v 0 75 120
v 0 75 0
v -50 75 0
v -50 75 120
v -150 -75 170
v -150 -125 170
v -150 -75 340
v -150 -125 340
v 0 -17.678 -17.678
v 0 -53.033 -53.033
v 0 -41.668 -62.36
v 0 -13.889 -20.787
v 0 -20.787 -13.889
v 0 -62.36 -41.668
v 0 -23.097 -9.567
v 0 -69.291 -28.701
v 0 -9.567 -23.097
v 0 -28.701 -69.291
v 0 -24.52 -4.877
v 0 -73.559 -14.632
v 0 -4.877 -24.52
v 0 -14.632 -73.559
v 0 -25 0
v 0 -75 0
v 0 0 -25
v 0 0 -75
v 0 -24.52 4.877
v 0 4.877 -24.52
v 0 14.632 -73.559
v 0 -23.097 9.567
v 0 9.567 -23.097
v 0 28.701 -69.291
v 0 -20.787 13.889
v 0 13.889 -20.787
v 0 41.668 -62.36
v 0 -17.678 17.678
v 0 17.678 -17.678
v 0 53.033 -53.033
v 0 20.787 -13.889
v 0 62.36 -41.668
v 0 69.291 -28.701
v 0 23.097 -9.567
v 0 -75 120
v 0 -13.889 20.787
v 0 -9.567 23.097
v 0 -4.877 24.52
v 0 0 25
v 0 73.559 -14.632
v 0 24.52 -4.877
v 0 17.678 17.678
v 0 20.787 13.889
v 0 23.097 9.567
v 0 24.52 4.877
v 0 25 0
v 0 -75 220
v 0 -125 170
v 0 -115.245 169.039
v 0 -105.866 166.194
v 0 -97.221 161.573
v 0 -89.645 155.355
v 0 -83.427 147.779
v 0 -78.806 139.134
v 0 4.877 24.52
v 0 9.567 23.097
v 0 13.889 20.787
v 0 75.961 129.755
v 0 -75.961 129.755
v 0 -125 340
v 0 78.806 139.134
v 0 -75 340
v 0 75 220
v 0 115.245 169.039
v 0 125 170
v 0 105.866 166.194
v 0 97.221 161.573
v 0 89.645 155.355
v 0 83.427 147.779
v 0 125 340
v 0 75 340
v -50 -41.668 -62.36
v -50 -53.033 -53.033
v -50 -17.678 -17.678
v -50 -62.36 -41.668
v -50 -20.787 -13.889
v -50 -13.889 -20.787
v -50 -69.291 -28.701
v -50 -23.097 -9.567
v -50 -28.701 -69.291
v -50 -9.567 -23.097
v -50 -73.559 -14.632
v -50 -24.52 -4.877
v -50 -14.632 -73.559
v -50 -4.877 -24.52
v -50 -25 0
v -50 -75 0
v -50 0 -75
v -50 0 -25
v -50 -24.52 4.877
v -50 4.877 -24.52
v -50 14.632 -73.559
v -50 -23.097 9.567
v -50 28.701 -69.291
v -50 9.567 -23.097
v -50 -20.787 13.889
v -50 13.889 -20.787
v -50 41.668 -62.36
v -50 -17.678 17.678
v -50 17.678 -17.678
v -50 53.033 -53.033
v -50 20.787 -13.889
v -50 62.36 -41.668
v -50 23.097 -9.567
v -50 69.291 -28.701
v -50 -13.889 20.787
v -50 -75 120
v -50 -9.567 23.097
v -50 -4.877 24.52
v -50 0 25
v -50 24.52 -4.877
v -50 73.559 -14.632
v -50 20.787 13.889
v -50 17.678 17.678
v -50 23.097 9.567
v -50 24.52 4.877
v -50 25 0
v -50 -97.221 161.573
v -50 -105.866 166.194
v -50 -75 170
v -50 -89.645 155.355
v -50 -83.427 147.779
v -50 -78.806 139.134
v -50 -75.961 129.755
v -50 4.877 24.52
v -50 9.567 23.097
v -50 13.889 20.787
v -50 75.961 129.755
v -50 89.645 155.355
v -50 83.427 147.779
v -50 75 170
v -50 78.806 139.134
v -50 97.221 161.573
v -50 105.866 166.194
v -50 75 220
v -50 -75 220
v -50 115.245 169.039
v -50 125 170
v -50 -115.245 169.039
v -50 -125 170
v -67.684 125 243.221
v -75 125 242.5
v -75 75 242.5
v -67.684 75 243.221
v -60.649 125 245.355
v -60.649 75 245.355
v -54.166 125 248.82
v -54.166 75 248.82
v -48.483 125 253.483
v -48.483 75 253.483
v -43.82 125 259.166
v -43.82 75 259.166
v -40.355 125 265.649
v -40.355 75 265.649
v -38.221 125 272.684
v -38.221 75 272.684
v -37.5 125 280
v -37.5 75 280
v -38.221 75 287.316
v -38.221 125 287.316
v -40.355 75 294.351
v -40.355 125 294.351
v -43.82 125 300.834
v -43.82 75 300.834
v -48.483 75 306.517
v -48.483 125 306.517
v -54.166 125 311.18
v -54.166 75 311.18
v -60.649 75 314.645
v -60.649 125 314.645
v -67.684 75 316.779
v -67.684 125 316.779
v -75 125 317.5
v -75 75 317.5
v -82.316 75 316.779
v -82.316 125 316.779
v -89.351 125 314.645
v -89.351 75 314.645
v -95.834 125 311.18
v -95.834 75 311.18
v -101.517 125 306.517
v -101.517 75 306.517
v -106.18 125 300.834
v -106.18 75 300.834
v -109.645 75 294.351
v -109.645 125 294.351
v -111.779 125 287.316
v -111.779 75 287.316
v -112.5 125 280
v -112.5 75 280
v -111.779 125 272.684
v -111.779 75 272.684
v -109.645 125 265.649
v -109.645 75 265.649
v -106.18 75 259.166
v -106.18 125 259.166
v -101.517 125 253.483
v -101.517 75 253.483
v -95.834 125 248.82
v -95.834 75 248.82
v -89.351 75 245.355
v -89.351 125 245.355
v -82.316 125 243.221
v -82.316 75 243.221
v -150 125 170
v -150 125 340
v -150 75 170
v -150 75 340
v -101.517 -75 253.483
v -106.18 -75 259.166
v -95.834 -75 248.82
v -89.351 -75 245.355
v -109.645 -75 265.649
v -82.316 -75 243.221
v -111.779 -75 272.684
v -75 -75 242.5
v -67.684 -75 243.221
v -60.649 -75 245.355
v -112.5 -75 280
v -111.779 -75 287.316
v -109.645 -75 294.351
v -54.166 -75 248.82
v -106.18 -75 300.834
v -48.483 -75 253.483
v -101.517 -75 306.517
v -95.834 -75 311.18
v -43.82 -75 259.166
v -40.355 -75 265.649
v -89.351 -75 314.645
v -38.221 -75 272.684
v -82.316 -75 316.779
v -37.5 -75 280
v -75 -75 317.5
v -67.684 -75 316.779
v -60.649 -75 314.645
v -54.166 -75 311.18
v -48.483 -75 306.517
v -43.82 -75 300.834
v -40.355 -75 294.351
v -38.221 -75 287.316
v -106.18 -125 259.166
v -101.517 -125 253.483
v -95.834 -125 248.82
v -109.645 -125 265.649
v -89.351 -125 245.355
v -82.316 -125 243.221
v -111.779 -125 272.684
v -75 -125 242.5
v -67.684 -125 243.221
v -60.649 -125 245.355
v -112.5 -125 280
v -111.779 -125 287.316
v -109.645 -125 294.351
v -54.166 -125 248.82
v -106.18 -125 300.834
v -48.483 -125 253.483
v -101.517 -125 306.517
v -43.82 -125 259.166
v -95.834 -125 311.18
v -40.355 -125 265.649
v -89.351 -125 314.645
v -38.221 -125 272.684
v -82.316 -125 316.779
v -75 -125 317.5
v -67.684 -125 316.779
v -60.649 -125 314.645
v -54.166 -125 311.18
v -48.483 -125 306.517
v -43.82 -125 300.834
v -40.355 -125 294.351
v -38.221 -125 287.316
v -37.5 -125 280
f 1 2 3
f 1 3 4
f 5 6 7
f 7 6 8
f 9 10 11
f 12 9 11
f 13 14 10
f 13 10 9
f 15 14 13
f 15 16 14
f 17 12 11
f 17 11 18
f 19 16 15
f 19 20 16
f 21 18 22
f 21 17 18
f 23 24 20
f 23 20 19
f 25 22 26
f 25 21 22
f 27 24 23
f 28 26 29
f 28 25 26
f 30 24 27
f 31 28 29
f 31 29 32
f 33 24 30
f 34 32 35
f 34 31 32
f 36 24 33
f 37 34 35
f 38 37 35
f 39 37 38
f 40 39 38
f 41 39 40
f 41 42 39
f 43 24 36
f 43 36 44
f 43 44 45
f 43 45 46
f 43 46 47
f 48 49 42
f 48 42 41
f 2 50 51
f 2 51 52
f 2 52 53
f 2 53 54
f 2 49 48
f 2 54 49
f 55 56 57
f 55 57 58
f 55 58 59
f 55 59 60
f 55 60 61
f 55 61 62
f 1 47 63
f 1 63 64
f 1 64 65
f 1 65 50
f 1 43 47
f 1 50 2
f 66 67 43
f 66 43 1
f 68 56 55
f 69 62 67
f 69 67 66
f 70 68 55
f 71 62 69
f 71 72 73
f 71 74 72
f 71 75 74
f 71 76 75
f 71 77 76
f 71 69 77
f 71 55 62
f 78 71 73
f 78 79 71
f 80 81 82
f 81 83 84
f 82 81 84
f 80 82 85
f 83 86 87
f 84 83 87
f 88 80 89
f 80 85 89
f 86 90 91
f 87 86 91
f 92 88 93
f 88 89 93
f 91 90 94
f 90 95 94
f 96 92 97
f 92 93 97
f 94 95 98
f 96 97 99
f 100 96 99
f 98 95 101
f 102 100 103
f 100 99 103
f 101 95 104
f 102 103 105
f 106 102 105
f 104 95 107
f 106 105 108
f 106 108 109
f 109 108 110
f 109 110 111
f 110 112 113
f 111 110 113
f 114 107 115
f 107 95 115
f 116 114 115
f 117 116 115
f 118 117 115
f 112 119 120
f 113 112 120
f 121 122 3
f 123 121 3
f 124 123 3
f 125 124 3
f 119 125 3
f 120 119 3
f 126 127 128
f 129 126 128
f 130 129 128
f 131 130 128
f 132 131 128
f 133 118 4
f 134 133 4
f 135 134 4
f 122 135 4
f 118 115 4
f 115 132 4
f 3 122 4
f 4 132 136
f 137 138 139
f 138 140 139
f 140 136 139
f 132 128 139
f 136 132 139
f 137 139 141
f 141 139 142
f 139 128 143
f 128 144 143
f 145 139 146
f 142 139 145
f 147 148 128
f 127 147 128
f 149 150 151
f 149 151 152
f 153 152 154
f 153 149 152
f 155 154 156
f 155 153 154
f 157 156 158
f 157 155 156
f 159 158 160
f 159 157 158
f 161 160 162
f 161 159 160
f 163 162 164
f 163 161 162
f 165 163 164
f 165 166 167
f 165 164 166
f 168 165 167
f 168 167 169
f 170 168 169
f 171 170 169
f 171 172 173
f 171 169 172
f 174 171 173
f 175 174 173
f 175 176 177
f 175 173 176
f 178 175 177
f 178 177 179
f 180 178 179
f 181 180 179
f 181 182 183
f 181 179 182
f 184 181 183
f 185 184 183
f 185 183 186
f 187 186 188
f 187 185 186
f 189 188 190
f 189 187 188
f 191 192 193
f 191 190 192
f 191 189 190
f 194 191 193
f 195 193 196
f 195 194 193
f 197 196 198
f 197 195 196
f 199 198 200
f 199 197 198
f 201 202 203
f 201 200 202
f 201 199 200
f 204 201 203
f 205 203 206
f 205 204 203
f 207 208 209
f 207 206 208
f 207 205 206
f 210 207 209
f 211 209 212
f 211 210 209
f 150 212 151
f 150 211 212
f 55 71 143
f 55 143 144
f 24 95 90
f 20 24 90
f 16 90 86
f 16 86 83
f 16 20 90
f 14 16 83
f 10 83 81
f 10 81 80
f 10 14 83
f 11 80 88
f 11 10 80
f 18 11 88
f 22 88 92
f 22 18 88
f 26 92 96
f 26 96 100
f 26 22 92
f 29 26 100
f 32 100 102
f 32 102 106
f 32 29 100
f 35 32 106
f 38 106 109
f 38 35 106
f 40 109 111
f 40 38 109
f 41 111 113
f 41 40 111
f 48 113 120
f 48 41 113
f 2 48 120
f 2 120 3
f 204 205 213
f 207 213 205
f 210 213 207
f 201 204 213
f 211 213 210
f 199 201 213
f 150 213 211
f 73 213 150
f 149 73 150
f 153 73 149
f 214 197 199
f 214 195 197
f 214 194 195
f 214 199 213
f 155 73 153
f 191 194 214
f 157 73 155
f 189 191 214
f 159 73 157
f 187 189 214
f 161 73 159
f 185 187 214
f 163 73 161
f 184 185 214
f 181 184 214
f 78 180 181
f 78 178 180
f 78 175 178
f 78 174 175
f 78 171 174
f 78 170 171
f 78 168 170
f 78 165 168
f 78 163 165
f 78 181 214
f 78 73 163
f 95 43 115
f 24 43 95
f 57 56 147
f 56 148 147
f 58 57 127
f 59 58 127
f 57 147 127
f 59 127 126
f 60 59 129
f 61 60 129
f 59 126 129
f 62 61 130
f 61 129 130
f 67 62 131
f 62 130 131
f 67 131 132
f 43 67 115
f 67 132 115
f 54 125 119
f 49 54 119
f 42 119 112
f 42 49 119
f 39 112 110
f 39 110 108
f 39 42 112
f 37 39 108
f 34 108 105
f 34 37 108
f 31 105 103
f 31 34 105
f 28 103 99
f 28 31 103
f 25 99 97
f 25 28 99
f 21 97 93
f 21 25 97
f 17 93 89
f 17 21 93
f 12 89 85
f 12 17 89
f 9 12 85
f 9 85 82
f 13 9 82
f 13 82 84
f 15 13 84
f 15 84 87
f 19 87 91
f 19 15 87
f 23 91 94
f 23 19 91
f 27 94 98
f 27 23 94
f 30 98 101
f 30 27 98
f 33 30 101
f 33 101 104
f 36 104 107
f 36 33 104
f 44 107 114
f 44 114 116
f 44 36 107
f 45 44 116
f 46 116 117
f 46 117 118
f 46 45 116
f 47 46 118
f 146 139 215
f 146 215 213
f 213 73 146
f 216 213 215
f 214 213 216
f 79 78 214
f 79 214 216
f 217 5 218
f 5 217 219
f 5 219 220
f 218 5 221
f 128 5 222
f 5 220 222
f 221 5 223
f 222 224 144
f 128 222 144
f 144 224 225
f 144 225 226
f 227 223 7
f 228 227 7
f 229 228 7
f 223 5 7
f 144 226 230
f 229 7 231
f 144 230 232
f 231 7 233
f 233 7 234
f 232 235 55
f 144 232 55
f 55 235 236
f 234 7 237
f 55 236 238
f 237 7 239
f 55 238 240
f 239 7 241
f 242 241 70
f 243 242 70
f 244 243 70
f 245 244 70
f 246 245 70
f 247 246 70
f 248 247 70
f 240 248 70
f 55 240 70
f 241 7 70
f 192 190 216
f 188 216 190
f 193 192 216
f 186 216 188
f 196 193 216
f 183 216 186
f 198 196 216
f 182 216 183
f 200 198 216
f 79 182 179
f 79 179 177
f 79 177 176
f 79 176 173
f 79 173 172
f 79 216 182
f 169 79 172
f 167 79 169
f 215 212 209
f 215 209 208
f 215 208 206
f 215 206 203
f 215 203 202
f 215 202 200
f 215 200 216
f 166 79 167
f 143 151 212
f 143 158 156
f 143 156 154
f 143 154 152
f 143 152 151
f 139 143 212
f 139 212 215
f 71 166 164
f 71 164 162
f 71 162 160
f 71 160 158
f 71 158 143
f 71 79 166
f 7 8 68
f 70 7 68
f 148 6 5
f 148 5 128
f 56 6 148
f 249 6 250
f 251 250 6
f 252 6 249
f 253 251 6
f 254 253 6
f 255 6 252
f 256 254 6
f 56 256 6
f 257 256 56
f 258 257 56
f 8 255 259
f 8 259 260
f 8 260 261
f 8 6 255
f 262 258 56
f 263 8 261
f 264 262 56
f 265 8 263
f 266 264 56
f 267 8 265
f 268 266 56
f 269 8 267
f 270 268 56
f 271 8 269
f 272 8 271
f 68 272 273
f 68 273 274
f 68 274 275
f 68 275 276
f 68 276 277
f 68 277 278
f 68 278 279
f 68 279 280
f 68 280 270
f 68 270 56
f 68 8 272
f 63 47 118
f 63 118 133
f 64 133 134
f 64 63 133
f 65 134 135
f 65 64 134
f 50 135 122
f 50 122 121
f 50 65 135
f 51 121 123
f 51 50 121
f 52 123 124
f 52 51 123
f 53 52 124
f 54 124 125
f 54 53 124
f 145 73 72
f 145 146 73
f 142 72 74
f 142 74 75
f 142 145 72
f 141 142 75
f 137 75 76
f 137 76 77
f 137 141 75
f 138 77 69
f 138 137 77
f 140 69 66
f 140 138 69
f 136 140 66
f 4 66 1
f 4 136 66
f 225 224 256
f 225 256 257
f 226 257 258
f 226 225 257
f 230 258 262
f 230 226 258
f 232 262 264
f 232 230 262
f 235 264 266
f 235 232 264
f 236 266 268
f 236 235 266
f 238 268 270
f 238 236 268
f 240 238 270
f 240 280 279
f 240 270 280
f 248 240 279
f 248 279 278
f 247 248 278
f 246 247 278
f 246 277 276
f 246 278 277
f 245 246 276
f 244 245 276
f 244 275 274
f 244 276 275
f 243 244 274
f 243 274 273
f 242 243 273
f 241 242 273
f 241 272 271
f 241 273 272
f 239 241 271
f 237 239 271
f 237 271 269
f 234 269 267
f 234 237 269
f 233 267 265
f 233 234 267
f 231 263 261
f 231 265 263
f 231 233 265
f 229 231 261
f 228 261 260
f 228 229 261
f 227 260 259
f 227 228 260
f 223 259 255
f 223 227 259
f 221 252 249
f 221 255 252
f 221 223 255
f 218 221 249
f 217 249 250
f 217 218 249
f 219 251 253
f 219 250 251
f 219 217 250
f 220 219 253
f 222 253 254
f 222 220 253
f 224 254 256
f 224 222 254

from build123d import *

# Parameters (mm, degrees)
BOSS_EXTRUDE1_DEPTH     = 50
FILLET1_R               = 50
SKETCH2_W               = 150
SKETCH2_H               = 170
BOSS_EXTRUDE2_DEPTH     = 50
SKETCH3_W               = 150
SKETCH3_H               = 170
BOSS_EXTRUDE3_DEPTH     = 50
CUT_EXTRUDE1_DEPTH      = 448.883913531
CUT_EXTRUDE1_DEPTH_BACK = 448.883913531
SKETCH4_R               = 37.5


with BuildPart() as part:
    # Sketch1 → Boss-Extrude1 (new body)
    # profile 1 of 4: a face of its own
    with BuildSketch(Plane.YZ):
        with BuildLine():
            Line((-75, 170), (-75, 0))
            ThreePointArc((-75, 0), (-53.033008589, 53.033008589), (0, 75))
            Line((0, 75), (0, 220))
            Line((0, 220), (-75, 220))
            Line((-75, 220), (-75, 340))
            Line((-75, 340), (-125, 340))
            Line((-125, 340), (-125, 170))
            Line((-125, 170), (-75, 170))
        make_face()
    # profile 2 of 4: a face of its own
    with BuildSketch(Plane.YZ):
        with BuildLine():
            ThreePointArc((0, 75), (53.033008589, 53.033008589), (75, 0))
            Line((75, 0), (75, 170))
            Line((75, 170), (125, 170))
            Line((125, 170), (125, 340))
            Line((125, 340), (75, 340))
            Line((75, 340), (75, 220))
            Line((75, 220), (0, 220))
            Line((0, 220), (0, 75))
        make_face()
    # profile 3 of 4: a face of its own
    with BuildSketch(Plane.YZ):
        with BuildLine():
            ThreePointArc((0, 75), (-53.033008589, 53.033008589), (-75, 0))
            ThreePointArc((-75, 0), (0, -75), (75, 0))
            ThreePointArc((75, 0), (53.033008589, 53.033008589), (0, 75))
        make_face()
        with BuildLine():
            ThreePointArc((25, 0), (-17.67766953, -17.67766953), (0, 25))
            ThreePointArc((0, 25), (17.67766953, 17.67766953), (25, 0))
        make_face(mode=Mode.SUBTRACT)
    # profile 4 of 4: a face of its own
    with BuildSketch(Plane.YZ):
        with BuildLine():
            ThreePointArc((0, 75), (-53.033008589, 53.033008589), (-75, 0))
            ThreePointArc((-75, 0), (0, -75), (75, 0))
            ThreePointArc((75, 0), (53.033008589, 53.033008589), (0, 75))
        make_face()
        with BuildLine():
            ThreePointArc((25, 0), (-17.67766953, -17.67766953), (0, 25))
            ThreePointArc((0, 25), (17.67766953, 17.67766953), (25, 0))
        make_face(mode=Mode.SUBTRACT)
    extrude(amount=-BOSS_EXTRUDE1_DEPTH)

    # Fillet1
    fillet1_edges = [part.edges().sort_by_distance(p)[0] for p in [
        (-25, 75, 170),
        (-25, -75, 170),
    ]]
    fillet(fillet1_edges, radius=FILLET1_R - 0.0001)  # a hair under: the kernel refuses the full size

    # Sketch2 → Boss-Extrude2 (add)
    with BuildSketch(Plane(origin=(0, 125, 0), x_dir=(-1, 0, 0), z_dir=(0, 1, 0))):
        with Locations((75, 255)):
            Rectangle(SKETCH2_W, SKETCH2_H)
    extrude(amount=-BOSS_EXTRUDE2_DEPTH)

    # Sketch3 → Boss-Extrude3 (add)
    with BuildSketch(Plane.XZ.offset(125)):
        with Locations((-75, 255)):
            Rectangle(SKETCH3_W, SKETCH3_H)
    extrude(amount=-BOSS_EXTRUDE3_DEPTH)

    # Sketch4 → Cut-Extrude1 (cut, two sides: drawn at the far end of the back side and taken through both)
    with BuildSketch(Plane.XZ.offset(125).offset(-CUT_EXTRUDE1_DEPTH_BACK)):
        with Locations(Location((-75, 280, 0), (0, 0, 270))):
            Circle(SKETCH4_R)
    extrude(amount=CUT_EXTRUDE1_DEPTH + CUT_EXTRUDE1_DEPTH_BACK, mode=Mode.SUBTRACT)


solid = part.part
